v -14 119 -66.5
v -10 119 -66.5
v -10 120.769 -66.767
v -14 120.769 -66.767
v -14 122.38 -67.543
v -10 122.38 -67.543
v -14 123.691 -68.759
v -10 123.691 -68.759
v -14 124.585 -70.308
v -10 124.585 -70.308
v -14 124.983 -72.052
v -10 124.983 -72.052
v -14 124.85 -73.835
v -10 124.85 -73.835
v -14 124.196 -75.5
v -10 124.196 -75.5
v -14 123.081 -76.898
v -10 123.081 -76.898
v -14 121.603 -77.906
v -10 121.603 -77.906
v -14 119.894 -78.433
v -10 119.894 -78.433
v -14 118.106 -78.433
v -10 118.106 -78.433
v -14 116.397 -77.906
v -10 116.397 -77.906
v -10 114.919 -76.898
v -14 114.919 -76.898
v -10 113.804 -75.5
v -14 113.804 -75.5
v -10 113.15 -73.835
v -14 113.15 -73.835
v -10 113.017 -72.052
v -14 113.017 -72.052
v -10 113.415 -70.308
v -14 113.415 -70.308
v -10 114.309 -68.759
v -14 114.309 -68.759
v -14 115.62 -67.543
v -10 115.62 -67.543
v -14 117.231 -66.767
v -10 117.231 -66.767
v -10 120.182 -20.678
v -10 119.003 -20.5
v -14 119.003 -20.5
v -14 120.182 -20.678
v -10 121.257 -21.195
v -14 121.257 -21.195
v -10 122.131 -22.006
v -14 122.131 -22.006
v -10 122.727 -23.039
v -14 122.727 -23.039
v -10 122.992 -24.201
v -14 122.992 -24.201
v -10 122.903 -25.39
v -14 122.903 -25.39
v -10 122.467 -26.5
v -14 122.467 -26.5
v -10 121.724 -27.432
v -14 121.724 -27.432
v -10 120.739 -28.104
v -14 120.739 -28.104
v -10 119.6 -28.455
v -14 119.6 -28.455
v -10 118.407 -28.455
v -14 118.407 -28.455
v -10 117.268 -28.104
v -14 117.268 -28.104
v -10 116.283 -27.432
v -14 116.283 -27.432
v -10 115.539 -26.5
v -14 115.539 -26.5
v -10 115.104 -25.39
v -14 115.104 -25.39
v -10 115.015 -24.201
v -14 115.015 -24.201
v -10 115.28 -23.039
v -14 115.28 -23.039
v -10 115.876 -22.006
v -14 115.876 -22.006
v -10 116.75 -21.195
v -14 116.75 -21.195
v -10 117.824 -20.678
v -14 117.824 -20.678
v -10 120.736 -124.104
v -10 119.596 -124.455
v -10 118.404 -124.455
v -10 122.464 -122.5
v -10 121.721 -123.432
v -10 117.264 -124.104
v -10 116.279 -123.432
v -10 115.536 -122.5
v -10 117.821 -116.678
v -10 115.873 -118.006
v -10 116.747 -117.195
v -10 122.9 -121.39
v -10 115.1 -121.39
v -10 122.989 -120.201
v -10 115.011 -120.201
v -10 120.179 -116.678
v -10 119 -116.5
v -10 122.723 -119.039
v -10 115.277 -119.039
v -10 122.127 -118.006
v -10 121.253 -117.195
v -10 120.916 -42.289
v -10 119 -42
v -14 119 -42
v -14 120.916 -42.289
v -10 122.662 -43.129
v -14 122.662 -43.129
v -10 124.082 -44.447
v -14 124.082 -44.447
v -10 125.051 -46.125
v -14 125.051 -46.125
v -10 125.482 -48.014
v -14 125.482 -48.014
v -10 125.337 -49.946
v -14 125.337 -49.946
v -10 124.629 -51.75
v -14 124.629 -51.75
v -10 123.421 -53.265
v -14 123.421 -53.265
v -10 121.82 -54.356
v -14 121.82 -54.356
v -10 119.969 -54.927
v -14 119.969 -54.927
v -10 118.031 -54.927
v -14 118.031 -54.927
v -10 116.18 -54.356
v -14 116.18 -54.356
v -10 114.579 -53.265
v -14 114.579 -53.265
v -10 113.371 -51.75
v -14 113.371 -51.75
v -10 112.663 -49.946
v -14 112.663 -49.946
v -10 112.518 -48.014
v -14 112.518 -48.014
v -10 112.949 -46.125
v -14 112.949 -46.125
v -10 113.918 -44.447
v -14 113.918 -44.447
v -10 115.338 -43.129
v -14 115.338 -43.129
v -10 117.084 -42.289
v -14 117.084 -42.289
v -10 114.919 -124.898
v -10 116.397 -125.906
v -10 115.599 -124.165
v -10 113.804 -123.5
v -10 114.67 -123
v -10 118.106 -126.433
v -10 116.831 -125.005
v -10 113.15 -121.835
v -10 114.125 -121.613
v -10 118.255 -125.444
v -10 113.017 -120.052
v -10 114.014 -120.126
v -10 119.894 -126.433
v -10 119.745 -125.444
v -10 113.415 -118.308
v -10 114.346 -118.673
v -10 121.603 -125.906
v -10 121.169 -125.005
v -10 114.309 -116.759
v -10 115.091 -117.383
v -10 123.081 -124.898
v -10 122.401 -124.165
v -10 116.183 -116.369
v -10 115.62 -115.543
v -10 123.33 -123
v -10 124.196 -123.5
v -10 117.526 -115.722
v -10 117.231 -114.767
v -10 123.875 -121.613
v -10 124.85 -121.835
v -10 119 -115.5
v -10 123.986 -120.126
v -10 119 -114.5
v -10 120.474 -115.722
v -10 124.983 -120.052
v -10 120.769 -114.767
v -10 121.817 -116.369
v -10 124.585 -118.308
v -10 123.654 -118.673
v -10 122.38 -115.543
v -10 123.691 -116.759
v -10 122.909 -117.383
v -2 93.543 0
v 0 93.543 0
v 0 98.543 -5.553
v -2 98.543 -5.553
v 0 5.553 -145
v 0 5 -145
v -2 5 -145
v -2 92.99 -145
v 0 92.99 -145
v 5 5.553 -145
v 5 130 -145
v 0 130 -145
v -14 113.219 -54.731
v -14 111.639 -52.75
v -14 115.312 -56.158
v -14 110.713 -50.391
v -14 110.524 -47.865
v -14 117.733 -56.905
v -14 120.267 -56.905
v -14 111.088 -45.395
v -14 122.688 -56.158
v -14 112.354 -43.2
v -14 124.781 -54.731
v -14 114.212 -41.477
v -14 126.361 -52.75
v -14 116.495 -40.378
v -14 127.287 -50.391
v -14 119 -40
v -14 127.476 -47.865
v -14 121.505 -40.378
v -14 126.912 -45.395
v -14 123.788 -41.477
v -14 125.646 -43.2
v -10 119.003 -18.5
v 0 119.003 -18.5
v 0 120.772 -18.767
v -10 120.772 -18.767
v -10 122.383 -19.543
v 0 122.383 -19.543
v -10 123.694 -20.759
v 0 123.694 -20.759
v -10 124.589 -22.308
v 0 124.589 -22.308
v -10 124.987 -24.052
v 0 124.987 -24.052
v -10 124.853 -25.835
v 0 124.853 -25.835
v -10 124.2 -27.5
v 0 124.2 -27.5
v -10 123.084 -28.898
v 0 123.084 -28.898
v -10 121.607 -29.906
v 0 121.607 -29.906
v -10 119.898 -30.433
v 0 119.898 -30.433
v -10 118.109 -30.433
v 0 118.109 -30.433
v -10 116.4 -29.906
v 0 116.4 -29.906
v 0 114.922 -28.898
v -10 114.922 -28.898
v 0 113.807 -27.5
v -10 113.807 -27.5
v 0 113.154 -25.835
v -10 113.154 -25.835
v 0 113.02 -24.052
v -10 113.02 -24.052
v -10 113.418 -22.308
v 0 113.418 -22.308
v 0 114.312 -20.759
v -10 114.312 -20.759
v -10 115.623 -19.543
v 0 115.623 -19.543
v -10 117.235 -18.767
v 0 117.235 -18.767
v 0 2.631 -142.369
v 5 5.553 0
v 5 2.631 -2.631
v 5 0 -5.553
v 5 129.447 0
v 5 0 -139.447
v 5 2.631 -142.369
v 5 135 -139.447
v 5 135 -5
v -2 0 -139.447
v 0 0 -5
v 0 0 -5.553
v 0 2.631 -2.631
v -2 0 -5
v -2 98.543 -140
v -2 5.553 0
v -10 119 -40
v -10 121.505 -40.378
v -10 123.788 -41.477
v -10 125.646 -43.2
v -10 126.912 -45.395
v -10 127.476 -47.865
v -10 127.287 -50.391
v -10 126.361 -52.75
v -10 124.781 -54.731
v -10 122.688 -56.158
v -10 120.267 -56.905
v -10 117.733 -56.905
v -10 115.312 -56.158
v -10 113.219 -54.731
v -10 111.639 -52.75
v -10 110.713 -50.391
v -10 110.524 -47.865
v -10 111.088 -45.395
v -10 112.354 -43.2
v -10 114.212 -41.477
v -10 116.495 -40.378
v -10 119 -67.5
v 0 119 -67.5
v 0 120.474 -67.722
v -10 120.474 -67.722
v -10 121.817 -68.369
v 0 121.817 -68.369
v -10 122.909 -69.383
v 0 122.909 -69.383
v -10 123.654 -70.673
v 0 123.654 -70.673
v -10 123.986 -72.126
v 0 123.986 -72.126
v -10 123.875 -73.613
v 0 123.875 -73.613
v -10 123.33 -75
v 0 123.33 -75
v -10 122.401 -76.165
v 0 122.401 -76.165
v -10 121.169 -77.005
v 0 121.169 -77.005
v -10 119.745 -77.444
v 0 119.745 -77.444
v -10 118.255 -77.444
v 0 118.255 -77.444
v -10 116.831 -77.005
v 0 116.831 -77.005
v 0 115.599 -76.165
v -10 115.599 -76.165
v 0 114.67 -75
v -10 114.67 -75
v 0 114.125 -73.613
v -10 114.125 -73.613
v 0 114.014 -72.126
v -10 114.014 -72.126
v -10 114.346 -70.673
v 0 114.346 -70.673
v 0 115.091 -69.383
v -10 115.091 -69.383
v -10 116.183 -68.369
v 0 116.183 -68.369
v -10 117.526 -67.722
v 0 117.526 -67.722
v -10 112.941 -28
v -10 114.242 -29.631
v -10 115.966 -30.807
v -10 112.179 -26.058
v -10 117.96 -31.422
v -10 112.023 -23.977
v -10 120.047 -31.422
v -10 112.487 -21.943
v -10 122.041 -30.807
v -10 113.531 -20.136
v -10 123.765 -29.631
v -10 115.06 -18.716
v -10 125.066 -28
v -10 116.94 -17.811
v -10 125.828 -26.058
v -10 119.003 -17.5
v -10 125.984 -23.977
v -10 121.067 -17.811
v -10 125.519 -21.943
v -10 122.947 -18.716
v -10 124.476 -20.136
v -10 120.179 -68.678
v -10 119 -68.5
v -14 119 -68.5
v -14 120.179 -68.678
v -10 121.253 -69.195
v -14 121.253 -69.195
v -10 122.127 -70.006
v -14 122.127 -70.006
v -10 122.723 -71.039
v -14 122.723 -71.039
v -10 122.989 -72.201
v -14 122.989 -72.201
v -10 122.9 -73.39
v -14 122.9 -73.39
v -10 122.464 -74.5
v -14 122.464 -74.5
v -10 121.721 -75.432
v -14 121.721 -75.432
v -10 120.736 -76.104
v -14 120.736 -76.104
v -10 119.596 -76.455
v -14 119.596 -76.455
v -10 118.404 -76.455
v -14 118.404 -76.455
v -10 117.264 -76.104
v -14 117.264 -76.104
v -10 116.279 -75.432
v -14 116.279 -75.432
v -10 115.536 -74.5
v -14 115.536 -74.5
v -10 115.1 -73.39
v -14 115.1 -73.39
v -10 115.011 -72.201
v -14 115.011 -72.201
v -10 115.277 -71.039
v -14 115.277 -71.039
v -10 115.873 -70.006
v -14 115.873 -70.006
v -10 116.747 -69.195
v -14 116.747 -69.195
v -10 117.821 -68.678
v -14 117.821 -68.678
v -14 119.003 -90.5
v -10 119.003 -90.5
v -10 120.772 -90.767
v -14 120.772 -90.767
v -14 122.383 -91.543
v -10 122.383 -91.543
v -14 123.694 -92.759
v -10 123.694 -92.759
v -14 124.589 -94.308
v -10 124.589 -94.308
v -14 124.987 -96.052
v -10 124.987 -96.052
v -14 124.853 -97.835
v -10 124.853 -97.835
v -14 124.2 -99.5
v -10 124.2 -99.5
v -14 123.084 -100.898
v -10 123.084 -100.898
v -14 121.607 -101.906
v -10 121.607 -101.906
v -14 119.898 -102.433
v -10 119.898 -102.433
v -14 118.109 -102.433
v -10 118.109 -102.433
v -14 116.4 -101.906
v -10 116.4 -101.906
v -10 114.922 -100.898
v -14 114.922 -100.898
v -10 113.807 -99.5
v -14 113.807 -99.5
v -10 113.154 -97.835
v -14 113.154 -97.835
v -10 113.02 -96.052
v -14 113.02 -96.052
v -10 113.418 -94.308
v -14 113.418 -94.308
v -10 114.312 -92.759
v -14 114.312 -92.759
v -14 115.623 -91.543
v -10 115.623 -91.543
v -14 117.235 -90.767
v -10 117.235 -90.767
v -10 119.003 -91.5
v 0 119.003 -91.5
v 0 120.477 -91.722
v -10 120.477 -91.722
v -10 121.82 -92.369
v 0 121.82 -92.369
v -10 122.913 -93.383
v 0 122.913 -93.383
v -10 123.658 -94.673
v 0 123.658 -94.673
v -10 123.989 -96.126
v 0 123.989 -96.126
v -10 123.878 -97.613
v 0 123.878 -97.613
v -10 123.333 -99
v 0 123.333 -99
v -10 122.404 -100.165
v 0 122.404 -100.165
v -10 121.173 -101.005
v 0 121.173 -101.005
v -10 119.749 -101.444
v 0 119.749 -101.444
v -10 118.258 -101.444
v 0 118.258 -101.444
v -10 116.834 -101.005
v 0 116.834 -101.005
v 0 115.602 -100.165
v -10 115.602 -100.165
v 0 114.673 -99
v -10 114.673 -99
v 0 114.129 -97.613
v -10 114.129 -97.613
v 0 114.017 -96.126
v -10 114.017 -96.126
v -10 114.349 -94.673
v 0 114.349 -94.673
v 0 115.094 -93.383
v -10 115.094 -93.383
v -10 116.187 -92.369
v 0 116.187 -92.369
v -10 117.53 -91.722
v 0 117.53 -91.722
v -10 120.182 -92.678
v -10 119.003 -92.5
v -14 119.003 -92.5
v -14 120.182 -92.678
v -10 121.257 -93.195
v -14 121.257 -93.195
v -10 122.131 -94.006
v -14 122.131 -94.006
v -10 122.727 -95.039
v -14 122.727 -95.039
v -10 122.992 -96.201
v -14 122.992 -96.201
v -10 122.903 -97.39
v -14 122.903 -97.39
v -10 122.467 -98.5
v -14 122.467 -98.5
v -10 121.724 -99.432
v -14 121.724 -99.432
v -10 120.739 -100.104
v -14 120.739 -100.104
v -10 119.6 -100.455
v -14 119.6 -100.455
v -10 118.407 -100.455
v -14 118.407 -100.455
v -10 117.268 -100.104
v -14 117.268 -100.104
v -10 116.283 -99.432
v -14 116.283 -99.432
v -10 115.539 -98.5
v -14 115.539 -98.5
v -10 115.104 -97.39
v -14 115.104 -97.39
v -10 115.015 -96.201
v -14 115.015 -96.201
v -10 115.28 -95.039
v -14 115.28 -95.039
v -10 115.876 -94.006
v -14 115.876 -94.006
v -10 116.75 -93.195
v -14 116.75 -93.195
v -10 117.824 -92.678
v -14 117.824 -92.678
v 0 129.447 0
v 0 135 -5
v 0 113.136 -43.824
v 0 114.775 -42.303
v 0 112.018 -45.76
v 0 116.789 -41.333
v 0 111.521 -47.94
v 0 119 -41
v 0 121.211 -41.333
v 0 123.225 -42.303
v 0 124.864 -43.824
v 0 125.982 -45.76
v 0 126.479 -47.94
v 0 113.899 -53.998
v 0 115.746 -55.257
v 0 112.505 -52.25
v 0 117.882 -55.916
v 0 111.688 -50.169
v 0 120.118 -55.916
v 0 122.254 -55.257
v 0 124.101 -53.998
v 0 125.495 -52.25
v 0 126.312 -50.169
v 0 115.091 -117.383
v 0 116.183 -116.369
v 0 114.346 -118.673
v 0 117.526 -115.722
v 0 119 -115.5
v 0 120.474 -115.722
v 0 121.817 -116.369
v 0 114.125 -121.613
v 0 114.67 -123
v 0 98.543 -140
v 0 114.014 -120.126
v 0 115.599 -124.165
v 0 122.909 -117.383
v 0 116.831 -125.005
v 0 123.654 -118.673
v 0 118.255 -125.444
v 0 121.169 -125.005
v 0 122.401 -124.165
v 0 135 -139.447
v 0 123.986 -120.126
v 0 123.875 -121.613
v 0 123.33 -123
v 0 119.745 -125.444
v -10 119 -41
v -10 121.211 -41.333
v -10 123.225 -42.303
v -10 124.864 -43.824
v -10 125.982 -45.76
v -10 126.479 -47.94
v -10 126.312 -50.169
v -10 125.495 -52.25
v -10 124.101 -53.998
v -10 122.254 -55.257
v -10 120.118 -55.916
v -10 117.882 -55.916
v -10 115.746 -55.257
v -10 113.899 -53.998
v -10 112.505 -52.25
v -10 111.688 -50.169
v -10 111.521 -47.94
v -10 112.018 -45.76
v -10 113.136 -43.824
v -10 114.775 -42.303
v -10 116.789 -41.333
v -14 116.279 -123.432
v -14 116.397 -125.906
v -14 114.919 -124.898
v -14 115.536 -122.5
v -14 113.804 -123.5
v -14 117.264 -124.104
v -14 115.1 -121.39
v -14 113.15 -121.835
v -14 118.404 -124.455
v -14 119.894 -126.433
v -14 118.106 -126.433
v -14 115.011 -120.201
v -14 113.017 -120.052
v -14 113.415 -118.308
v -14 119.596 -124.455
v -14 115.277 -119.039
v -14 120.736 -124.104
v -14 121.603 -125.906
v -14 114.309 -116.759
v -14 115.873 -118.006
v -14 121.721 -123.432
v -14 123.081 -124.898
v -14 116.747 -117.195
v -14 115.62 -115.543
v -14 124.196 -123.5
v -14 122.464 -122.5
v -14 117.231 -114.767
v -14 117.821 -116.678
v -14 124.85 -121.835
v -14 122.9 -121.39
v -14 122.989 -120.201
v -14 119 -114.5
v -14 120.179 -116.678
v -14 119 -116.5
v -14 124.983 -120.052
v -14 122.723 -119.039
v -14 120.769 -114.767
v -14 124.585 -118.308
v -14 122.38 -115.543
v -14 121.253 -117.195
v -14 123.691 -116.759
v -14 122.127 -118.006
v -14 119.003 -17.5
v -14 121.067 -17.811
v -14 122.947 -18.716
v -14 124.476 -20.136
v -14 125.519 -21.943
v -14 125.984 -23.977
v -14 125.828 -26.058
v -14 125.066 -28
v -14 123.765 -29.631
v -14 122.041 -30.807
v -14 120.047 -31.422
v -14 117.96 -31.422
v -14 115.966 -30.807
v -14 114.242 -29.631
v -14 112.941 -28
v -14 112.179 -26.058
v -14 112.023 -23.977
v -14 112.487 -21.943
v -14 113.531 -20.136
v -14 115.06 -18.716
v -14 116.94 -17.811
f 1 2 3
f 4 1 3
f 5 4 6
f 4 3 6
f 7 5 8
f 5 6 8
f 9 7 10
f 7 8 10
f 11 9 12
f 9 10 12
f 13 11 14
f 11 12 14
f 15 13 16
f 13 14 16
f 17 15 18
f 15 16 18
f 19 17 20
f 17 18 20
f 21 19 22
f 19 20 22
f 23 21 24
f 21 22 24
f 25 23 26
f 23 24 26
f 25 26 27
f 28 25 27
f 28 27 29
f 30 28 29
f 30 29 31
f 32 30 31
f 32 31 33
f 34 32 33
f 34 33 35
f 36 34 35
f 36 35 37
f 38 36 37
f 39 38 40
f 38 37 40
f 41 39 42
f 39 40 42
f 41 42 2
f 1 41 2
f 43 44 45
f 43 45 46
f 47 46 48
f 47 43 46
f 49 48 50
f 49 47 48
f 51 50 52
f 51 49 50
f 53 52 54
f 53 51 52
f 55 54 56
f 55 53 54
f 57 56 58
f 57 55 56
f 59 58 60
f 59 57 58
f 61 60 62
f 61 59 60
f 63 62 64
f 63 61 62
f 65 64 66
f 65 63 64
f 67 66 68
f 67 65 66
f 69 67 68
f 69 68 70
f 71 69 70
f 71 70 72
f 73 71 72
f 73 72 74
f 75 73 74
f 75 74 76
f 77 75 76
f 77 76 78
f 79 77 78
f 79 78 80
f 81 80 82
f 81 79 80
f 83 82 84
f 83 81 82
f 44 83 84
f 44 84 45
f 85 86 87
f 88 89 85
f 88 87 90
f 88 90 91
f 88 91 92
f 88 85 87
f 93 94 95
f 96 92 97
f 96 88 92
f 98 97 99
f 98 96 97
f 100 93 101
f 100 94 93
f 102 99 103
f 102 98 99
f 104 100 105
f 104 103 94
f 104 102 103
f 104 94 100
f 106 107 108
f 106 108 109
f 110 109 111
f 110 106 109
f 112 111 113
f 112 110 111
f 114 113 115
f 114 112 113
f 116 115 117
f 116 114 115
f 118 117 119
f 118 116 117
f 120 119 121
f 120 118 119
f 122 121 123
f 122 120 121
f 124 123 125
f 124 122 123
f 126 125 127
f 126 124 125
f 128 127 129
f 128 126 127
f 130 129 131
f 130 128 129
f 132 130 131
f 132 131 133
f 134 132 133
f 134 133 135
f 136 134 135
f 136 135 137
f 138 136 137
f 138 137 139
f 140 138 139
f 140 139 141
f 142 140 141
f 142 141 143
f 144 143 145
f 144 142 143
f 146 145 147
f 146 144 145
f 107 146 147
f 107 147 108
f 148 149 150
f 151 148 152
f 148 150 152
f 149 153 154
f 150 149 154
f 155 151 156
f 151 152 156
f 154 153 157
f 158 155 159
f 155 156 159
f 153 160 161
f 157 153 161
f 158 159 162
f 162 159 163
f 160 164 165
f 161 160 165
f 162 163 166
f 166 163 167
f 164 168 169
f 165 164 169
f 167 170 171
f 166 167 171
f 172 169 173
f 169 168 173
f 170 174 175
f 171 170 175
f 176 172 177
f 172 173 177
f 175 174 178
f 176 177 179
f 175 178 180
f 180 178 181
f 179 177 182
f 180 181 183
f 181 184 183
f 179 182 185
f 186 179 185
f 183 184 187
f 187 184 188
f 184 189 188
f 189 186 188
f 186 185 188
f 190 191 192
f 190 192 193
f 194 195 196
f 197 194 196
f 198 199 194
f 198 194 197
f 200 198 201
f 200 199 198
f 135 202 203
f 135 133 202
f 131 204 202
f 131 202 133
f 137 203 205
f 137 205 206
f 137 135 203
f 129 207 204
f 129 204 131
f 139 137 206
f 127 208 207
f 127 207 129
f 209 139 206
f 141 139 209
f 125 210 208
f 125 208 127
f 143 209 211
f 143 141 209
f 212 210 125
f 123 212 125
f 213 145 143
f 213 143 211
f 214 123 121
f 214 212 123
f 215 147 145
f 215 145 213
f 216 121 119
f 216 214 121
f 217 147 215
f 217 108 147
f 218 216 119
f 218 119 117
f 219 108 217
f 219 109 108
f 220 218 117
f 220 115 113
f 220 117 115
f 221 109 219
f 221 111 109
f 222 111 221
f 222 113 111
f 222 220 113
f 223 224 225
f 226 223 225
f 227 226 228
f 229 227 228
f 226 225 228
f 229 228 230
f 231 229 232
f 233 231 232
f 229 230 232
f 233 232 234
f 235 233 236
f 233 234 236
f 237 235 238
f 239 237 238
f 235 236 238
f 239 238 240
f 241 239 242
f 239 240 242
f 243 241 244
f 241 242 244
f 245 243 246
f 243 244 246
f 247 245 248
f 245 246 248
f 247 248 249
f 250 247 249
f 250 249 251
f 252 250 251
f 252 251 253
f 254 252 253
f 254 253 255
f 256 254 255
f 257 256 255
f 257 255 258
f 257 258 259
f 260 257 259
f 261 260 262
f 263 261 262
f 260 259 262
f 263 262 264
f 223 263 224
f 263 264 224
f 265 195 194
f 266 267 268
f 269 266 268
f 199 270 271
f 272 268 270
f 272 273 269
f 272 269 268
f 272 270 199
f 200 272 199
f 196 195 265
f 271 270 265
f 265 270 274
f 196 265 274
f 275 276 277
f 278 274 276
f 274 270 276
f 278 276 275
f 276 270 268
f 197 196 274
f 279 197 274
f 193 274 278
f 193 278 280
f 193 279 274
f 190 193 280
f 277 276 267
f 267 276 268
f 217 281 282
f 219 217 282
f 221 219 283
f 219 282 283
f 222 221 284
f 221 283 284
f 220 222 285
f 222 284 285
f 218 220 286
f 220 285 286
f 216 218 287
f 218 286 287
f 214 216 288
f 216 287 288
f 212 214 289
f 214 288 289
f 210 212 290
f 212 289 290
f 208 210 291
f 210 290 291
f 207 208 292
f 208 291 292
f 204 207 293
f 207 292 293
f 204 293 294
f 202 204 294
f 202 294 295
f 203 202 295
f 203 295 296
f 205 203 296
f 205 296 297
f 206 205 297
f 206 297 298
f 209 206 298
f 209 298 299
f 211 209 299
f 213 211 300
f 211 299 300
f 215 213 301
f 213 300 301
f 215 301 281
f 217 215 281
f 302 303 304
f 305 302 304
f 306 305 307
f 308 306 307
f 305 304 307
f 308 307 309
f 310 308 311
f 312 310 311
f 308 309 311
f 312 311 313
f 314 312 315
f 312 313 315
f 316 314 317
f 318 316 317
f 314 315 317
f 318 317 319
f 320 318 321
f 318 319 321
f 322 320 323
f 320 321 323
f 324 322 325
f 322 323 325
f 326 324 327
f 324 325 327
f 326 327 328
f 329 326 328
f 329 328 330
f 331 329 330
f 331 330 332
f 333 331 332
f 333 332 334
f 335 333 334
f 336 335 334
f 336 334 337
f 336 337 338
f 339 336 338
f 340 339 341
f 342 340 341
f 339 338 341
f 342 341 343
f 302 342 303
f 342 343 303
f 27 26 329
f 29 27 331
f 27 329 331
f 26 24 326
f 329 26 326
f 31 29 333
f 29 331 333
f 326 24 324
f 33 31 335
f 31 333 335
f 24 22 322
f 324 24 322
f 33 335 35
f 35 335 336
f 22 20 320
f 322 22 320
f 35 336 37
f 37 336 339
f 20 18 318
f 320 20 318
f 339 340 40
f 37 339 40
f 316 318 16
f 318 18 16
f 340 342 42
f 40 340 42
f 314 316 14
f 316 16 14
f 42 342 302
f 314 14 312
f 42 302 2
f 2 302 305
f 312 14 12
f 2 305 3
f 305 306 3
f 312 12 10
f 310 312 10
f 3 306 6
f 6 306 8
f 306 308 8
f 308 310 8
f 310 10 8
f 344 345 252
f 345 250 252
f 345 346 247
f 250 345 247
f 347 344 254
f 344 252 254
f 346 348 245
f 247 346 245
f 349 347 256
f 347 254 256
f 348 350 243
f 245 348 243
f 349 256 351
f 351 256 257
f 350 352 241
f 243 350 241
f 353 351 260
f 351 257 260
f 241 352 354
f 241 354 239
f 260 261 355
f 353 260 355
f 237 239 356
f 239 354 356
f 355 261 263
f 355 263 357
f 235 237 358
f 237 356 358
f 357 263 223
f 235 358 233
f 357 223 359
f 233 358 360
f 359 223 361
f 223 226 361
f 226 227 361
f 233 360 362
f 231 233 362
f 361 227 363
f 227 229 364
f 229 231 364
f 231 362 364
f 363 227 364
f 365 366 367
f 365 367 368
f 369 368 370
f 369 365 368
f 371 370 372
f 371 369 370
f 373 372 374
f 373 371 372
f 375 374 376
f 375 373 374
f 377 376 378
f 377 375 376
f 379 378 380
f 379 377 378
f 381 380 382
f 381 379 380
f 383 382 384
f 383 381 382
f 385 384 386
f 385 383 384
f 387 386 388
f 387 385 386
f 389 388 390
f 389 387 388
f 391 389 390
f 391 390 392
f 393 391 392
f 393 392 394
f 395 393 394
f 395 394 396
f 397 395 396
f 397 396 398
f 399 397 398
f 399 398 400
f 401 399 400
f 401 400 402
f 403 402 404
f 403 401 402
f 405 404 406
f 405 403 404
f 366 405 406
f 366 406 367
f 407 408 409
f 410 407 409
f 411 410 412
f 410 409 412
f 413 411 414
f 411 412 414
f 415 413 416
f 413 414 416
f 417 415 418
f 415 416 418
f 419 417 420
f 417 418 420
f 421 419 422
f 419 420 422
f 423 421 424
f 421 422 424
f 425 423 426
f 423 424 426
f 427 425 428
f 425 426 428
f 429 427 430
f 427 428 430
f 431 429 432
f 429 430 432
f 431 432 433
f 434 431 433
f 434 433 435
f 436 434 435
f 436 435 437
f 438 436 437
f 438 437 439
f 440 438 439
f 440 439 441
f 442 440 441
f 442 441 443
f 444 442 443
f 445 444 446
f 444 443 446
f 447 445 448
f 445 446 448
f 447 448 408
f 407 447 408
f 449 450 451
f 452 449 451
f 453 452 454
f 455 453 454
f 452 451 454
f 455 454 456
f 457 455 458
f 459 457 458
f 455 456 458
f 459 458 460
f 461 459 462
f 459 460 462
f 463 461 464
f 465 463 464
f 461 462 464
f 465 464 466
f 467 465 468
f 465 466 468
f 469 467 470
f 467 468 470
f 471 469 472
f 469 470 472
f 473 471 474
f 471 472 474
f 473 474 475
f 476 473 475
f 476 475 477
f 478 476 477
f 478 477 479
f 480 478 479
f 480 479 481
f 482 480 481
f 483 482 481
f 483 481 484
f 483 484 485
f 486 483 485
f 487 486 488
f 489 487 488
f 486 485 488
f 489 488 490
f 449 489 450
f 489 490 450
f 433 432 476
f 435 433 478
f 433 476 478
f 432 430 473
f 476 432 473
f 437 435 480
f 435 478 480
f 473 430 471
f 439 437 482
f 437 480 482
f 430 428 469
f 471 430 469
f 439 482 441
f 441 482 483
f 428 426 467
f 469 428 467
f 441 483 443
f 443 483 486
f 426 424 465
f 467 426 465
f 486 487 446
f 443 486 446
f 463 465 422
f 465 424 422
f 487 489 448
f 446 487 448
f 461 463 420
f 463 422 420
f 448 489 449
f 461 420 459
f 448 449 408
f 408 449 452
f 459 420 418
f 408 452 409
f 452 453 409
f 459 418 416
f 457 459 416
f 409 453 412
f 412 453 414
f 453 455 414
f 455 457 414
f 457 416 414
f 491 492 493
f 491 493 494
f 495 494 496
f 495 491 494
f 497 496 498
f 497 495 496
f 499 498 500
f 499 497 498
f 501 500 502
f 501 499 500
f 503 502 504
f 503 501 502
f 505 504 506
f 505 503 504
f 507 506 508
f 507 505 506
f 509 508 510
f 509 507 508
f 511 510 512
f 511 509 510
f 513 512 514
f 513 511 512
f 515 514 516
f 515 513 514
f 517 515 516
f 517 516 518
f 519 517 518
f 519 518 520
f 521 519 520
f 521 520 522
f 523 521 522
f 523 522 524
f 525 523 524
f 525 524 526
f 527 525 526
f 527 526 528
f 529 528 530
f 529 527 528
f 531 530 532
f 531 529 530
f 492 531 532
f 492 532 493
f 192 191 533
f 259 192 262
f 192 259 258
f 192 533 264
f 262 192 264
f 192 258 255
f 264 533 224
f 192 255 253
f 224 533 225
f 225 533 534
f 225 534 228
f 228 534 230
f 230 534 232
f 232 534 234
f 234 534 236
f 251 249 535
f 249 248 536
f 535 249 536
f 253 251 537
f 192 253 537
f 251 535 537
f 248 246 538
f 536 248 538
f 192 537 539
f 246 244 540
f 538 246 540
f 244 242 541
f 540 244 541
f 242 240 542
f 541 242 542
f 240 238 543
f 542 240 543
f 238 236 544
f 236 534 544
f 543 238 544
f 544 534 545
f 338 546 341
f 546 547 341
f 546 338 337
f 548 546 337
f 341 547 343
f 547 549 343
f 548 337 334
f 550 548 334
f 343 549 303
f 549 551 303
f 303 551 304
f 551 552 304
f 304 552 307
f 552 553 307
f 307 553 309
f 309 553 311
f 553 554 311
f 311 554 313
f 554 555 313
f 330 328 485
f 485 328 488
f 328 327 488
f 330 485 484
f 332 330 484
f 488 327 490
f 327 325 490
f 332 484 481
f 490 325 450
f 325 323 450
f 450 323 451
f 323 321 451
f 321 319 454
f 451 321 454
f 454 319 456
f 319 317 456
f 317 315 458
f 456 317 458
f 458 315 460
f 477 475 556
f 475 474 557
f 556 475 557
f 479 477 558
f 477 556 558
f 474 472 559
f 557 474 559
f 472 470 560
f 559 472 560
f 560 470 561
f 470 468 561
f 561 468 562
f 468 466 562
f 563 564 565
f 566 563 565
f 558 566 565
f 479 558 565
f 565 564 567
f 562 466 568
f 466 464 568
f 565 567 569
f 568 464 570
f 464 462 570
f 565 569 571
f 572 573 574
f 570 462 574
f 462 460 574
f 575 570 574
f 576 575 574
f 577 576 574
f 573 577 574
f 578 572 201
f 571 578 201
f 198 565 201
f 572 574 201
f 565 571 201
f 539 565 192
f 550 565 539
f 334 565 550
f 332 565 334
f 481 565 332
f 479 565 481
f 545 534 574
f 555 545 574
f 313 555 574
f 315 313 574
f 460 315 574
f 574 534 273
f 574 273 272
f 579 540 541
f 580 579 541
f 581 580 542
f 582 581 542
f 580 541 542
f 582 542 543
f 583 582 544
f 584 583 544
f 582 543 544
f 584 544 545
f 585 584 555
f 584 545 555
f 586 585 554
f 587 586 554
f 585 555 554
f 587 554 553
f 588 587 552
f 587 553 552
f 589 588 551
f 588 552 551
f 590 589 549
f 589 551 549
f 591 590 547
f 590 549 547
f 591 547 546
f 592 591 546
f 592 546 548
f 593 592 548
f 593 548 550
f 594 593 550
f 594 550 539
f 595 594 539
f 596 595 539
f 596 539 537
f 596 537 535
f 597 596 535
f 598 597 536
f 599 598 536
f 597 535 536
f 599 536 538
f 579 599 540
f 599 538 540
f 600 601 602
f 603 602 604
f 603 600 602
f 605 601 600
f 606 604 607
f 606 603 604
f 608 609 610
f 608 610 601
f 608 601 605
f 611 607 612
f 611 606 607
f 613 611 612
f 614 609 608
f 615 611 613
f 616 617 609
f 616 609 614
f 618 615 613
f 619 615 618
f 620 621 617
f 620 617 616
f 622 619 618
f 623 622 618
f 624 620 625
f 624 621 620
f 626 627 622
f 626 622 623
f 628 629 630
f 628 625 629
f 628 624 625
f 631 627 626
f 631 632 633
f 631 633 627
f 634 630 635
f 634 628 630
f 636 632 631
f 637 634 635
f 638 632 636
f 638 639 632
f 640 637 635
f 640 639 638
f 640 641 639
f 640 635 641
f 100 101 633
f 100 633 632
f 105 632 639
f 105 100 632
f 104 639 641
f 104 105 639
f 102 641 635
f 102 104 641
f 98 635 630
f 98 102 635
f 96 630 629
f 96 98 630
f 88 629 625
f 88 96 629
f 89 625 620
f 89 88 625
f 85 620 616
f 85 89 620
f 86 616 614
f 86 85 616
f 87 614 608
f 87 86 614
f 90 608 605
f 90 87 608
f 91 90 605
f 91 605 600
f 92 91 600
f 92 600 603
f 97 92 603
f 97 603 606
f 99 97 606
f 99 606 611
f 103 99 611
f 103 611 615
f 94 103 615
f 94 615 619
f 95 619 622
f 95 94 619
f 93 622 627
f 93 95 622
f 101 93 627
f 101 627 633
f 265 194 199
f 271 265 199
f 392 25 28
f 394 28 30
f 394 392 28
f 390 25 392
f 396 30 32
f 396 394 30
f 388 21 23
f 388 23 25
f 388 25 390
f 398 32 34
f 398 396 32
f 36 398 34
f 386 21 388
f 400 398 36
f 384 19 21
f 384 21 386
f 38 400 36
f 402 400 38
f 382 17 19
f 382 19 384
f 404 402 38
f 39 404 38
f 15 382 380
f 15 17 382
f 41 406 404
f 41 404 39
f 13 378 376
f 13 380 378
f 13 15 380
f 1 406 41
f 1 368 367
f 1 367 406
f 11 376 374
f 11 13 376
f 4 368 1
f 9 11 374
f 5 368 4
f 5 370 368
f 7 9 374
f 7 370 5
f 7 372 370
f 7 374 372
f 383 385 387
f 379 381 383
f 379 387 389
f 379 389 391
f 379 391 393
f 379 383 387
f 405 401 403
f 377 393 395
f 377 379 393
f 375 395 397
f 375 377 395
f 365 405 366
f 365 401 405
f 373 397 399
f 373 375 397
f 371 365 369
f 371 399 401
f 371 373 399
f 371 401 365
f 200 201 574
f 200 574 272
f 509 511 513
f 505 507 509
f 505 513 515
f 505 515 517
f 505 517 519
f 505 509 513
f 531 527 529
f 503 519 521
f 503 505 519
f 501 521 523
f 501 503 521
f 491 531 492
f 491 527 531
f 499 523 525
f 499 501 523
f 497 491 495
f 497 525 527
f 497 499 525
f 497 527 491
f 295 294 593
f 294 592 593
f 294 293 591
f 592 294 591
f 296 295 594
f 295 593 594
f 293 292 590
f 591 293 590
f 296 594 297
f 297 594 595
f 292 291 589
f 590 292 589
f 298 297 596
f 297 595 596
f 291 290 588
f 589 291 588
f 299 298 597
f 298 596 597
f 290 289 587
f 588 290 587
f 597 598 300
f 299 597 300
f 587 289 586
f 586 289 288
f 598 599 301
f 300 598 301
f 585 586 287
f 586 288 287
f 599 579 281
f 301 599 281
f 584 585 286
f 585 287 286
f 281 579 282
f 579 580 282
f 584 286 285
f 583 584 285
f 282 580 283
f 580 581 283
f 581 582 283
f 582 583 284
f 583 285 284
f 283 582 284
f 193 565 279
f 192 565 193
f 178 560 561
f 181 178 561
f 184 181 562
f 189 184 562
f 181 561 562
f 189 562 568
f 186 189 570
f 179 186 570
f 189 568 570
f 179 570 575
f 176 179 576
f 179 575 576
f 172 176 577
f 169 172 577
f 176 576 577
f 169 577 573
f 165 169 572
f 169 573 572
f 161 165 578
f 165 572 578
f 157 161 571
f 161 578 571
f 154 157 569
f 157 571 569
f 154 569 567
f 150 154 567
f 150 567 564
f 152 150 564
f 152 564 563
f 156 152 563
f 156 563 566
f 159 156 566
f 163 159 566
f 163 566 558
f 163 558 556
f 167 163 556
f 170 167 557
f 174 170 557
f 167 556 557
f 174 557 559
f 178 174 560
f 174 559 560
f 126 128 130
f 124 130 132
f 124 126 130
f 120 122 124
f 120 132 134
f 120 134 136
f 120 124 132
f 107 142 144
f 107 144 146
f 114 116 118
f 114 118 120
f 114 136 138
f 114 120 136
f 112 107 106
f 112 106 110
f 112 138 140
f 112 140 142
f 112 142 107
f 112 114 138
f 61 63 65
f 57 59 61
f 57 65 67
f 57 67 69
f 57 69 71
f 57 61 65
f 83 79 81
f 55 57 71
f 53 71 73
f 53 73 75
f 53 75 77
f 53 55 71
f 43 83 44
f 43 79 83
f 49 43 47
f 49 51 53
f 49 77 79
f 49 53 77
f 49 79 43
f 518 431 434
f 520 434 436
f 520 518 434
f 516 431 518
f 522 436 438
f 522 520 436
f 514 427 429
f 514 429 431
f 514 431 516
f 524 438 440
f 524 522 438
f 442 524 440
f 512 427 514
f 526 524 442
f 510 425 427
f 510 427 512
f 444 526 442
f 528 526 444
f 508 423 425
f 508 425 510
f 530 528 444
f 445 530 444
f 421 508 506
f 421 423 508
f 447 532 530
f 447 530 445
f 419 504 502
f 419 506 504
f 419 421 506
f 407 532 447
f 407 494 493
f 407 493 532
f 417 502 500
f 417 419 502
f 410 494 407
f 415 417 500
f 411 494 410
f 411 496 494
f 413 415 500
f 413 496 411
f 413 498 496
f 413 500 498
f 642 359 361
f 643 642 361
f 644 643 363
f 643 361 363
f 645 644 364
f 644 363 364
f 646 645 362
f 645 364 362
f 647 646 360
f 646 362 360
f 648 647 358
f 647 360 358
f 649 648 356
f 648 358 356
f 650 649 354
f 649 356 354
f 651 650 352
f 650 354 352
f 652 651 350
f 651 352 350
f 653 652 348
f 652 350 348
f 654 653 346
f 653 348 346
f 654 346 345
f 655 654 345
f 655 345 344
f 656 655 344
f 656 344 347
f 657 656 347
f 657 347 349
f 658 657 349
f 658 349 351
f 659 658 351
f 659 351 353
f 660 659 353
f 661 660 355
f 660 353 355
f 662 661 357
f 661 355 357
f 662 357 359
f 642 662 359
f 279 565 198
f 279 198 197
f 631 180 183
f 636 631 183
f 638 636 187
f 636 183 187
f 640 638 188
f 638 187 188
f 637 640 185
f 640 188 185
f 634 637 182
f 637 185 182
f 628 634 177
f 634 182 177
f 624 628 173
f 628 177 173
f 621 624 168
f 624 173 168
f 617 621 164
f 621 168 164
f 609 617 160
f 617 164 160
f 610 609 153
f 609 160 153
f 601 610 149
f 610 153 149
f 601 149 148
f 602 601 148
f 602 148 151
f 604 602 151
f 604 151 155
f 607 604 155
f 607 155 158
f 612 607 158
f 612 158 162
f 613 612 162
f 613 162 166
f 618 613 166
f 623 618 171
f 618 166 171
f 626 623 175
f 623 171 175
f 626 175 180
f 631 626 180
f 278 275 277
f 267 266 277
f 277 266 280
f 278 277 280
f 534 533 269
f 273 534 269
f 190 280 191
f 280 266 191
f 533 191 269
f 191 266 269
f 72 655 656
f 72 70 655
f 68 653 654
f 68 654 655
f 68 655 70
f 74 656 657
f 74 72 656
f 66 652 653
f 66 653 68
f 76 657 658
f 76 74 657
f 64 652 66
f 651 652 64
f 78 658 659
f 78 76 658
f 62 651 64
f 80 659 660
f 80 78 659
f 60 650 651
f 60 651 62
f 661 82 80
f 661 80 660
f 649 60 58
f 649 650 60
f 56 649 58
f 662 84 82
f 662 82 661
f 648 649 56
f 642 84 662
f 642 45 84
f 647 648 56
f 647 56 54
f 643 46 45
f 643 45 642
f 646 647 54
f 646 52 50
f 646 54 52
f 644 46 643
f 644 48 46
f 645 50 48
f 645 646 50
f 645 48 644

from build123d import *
from OCP.BRepFilletAPI import BRepFilletAPI_MakeChamfer

# Parameters (mm, degrees)
SKETCH_1_W      = 145
SKETCH_1_H      = 135
EXTRUDE_1_DEPTH = 5
CHAMFER_1_SIZE  = 5
CHAMFER_1_SIZE2 = 5.553062574
SKETCH_2_W      = 145
SKETCH_2_H      = 98.542875089
EXTRUDE_2_DEPTH = 2
CHAMFER_2_SIZE  = 5
CHAMFER_2_SIZE2 = 5.553062574
SKETCH_3_R      = 5
SKETCH_3_R_2    = 7.5
SKETCH_3_R_3    = 6
EXTRUDE_3_DEPTH = 10
SKETCH_7_R      = 6
SKETCH_7_R_2    = 4
SKETCH_7_R_3    = 8.5
SKETCH_7_R_4    = 6.5
SKETCH_7_R_5    = 7
EXTRUDE_6_DEPTH = 4


with BuildPart() as part:
    # ｽｹｯﾁ1 → 押し出し1 (new body)
    with BuildSketch(Plane(origin=(0, 0, 0), x_dir=(0, 0, -1), z_dir=(1, 0, 0))):
        with Locations((72.5, 67.5)):
            Rectangle(SKETCH_1_W, SKETCH_1_H)
    extrude(amount=EXTRUDE_1_DEPTH)

    # 面取り1: one chamfer whose edges measure the first distance from different faces: ONE call of the kernel's chamfer builder (chamfer() names one face for all edges)
    chamfer_1_edges_1 = [part.edges().sort_by_distance(p)[0] for p in [
        (2.5, 135, 0),
    ]]
    chamfer_1_side_1 = [part.faces().sort_by_distance(p)[0] for p in [
        (2.5, 135, -72.5),
    ]]
    chamfer_1_edges_2 = [part.edges().sort_by_distance(p)[0] for p in [
        (2.5, 135, -145),
    ]]
    chamfer_1_side_2 = [part.faces().sort_by_distance(p)[0] for p in [
        (2.5, 67.5, -145),
    ]]
    chamfer_1_edges_3 = [part.edges().sort_by_distance(p)[0] for p in [
        (2.5, 0, -145),
    ]]
    chamfer_1_side_3 = [part.faces().sort_by_distance(p)[0] for p in [
        (2.5, 0, -72.5),
    ]]
    chamfer_1_edges_4 = [part.edges().sort_by_distance(p)[0] for p in [
        (2.5, 0, 0),
    ]]
    chamfer_1_side_4 = [part.faces().sort_by_distance(p)[0] for p in [
        (2.5, 67.5, 0),
    ]]
    chamfer_1 = BRepFilletAPI_MakeChamfer(part.part.solid().wrapped)
    for e in chamfer_1_edges_1:
        chamfer_1.Add(CHAMFER_1_SIZE, CHAMFER_1_SIZE2, e.wrapped, chamfer_1_side_1[0].wrapped)  # the first distance lies on this face
    for e in chamfer_1_edges_2:
        chamfer_1.Add(CHAMFER_1_SIZE, CHAMFER_1_SIZE2, e.wrapped, chamfer_1_side_2[0].wrapped)  # the first distance lies on this face
    for e in chamfer_1_edges_3:
        chamfer_1.Add(CHAMFER_1_SIZE, CHAMFER_1_SIZE2, e.wrapped, chamfer_1_side_3[0].wrapped)  # the first distance lies on this face
    for e in chamfer_1_edges_4:
        chamfer_1.Add(CHAMFER_1_SIZE, CHAMFER_1_SIZE2, e.wrapped, chamfer_1_side_4[0].wrapped)  # the first distance lies on this face
    add(Compound.cast(chamfer_1.Shape()), mode=Mode.REPLACE)

    # ｽｹｯﾁ2 → 押し出し2 (add)
    with BuildSketch(Plane.ZY):
        with Locations((-72.5, 49.271437545)):
            Rectangle(SKETCH_2_W, SKETCH_2_H)
    extrude(amount=EXTRUDE_2_DEPTH)

    # 面取り2: one chamfer whose edges measure the first distance from different faces: ONE call of the kernel's chamfer builder (chamfer() names one face for all edges)
    chamfer_2_edges_1 = [part.edges().sort_by_distance(p)[0] for p in [
        (-1, 0, -145),
    ]]
    chamfer_2_side_1 = [part.faces().sort_by_distance(p)[0] for p in [
        (1.658082608, 63.325171213, -145),
    ]]
    chamfer_2_edges_2 = [part.edges().sort_by_distance(p)[0] for p in [
        (-1, 0, 0),
    ]]
    chamfer_2_side_2 = [part.faces().sort_by_distance(p)[0] for p in [
        (1.44516378, 0, -72.693189796),
    ]]
    chamfer_2_edges_3 = [part.edges().sort_by_distance(p)[0] for p in [
        (-1, 98.542875089, 0),
    ]]
    chamfer_2_side_3 = [part.faces().sort_by_distance(p)[0] for p in [
        (1.658082608, 62.905146639, 0),
    ]]
    chamfer_2_edges_4 = [part.edges().sort_by_distance(p)[0] for p in [
        (-1, 98.542875089, -145),
    ]]
    chamfer_2_side_4 = [part.faces().sort_by_distance(p)[0] for p in [
        (-1, 98.542875089, -72.5),
    ]]
    chamfer_2 = BRepFilletAPI_MakeChamfer(part.part.solid().wrapped)
    for e in chamfer_2_edges_1:
        chamfer_2.Add(CHAMFER_2_SIZE, CHAMFER_2_SIZE2, e.wrapped, chamfer_2_side_1[0].wrapped)  # the first distance lies on this face
    for e in chamfer_2_edges_2:
        chamfer_2.Add(CHAMFER_2_SIZE, CHAMFER_2_SIZE2, e.wrapped, chamfer_2_side_2[0].wrapped)  # the first distance lies on this face
    for e in chamfer_2_edges_3:
        chamfer_2.Add(CHAMFER_2_SIZE, CHAMFER_2_SIZE2, e.wrapped, chamfer_2_side_3[0].wrapped)  # the first distance lies on this face
    for e in chamfer_2_edges_4:
        chamfer_2.Add(CHAMFER_2_SIZE, CHAMFER_2_SIZE2, e.wrapped, chamfer_2_side_4[0].wrapped)  # the first distance lies on this face
    add(Compound.cast(chamfer_2.Shape()), mode=Mode.REPLACE)

    # ｽｹｯﾁ3 → 押し出し3 (add)
    with BuildSketch(Plane.ZY):
        with Locations((-120.5, 119)):
            Circle(SKETCH_3_R)
        with Locations((-96.5, 119.003353079)):
            Circle(SKETCH_3_R)
        with Locations((-72.5, 119)):
            Circle(SKETCH_3_R)
        with Locations((-48.5, 119)):
            Circle(SKETCH_3_R_2)
        with Locations((-24.5, 119.003353079)):
            Circle(SKETCH_3_R_3)
    extrude(amount=EXTRUDE_3_DEPTH)

    # ｽｹｯﾁ7 → 押し出し6 (add)
    # profile 1 of 5: a face of its own
    with BuildSketch(Plane.ZY.offset(10)):
        with Locations((-120.5, 119)):
            Circle(SKETCH_7_R)
        with Locations((-120.5, 119)):
            Circle(SKETCH_7_R_2, mode=Mode.SUBTRACT)
    # profile 2 of 5: a face of its own
    with BuildSketch(Plane.ZY.offset(10)):
        with Locations((-96.5, 119.003353079)):
            Circle(SKETCH_7_R)
        with Locations((-96.5, 119.003353079)):
            Circle(SKETCH_7_R_2, mode=Mode.SUBTRACT)
    # profile 3 of 5: a face of its own
    with BuildSketch(Plane.ZY.offset(10)):
        with Locations((-72.5, 119)):
            Circle(SKETCH_7_R)
        with Locations((-72.5, 119)):
            Circle(SKETCH_7_R_2, mode=Mode.SUBTRACT)
    # profile 4 of 5: a face of its own
    with BuildSketch(Plane.ZY.offset(10)):
        with Locations((-48.5, 119)):
            Circle(SKETCH_7_R_3)
        with Locations((-48.5, 119)):
            Circle(SKETCH_7_R_4, mode=Mode.SUBTRACT)
    # profile 5 of 5: a face of its own
    with BuildSketch(Plane.ZY.offset(10)):
        with Locations((-24.5, 119.003353079)):
            Circle(SKETCH_7_R_5)
        with Locations((-24.5, 119.003353079)):
            Circle(SKETCH_7_R_2, mode=Mode.SUBTRACT)
    extrude(amount=EXTRUDE_6_DEPTH)


solid = part.part
